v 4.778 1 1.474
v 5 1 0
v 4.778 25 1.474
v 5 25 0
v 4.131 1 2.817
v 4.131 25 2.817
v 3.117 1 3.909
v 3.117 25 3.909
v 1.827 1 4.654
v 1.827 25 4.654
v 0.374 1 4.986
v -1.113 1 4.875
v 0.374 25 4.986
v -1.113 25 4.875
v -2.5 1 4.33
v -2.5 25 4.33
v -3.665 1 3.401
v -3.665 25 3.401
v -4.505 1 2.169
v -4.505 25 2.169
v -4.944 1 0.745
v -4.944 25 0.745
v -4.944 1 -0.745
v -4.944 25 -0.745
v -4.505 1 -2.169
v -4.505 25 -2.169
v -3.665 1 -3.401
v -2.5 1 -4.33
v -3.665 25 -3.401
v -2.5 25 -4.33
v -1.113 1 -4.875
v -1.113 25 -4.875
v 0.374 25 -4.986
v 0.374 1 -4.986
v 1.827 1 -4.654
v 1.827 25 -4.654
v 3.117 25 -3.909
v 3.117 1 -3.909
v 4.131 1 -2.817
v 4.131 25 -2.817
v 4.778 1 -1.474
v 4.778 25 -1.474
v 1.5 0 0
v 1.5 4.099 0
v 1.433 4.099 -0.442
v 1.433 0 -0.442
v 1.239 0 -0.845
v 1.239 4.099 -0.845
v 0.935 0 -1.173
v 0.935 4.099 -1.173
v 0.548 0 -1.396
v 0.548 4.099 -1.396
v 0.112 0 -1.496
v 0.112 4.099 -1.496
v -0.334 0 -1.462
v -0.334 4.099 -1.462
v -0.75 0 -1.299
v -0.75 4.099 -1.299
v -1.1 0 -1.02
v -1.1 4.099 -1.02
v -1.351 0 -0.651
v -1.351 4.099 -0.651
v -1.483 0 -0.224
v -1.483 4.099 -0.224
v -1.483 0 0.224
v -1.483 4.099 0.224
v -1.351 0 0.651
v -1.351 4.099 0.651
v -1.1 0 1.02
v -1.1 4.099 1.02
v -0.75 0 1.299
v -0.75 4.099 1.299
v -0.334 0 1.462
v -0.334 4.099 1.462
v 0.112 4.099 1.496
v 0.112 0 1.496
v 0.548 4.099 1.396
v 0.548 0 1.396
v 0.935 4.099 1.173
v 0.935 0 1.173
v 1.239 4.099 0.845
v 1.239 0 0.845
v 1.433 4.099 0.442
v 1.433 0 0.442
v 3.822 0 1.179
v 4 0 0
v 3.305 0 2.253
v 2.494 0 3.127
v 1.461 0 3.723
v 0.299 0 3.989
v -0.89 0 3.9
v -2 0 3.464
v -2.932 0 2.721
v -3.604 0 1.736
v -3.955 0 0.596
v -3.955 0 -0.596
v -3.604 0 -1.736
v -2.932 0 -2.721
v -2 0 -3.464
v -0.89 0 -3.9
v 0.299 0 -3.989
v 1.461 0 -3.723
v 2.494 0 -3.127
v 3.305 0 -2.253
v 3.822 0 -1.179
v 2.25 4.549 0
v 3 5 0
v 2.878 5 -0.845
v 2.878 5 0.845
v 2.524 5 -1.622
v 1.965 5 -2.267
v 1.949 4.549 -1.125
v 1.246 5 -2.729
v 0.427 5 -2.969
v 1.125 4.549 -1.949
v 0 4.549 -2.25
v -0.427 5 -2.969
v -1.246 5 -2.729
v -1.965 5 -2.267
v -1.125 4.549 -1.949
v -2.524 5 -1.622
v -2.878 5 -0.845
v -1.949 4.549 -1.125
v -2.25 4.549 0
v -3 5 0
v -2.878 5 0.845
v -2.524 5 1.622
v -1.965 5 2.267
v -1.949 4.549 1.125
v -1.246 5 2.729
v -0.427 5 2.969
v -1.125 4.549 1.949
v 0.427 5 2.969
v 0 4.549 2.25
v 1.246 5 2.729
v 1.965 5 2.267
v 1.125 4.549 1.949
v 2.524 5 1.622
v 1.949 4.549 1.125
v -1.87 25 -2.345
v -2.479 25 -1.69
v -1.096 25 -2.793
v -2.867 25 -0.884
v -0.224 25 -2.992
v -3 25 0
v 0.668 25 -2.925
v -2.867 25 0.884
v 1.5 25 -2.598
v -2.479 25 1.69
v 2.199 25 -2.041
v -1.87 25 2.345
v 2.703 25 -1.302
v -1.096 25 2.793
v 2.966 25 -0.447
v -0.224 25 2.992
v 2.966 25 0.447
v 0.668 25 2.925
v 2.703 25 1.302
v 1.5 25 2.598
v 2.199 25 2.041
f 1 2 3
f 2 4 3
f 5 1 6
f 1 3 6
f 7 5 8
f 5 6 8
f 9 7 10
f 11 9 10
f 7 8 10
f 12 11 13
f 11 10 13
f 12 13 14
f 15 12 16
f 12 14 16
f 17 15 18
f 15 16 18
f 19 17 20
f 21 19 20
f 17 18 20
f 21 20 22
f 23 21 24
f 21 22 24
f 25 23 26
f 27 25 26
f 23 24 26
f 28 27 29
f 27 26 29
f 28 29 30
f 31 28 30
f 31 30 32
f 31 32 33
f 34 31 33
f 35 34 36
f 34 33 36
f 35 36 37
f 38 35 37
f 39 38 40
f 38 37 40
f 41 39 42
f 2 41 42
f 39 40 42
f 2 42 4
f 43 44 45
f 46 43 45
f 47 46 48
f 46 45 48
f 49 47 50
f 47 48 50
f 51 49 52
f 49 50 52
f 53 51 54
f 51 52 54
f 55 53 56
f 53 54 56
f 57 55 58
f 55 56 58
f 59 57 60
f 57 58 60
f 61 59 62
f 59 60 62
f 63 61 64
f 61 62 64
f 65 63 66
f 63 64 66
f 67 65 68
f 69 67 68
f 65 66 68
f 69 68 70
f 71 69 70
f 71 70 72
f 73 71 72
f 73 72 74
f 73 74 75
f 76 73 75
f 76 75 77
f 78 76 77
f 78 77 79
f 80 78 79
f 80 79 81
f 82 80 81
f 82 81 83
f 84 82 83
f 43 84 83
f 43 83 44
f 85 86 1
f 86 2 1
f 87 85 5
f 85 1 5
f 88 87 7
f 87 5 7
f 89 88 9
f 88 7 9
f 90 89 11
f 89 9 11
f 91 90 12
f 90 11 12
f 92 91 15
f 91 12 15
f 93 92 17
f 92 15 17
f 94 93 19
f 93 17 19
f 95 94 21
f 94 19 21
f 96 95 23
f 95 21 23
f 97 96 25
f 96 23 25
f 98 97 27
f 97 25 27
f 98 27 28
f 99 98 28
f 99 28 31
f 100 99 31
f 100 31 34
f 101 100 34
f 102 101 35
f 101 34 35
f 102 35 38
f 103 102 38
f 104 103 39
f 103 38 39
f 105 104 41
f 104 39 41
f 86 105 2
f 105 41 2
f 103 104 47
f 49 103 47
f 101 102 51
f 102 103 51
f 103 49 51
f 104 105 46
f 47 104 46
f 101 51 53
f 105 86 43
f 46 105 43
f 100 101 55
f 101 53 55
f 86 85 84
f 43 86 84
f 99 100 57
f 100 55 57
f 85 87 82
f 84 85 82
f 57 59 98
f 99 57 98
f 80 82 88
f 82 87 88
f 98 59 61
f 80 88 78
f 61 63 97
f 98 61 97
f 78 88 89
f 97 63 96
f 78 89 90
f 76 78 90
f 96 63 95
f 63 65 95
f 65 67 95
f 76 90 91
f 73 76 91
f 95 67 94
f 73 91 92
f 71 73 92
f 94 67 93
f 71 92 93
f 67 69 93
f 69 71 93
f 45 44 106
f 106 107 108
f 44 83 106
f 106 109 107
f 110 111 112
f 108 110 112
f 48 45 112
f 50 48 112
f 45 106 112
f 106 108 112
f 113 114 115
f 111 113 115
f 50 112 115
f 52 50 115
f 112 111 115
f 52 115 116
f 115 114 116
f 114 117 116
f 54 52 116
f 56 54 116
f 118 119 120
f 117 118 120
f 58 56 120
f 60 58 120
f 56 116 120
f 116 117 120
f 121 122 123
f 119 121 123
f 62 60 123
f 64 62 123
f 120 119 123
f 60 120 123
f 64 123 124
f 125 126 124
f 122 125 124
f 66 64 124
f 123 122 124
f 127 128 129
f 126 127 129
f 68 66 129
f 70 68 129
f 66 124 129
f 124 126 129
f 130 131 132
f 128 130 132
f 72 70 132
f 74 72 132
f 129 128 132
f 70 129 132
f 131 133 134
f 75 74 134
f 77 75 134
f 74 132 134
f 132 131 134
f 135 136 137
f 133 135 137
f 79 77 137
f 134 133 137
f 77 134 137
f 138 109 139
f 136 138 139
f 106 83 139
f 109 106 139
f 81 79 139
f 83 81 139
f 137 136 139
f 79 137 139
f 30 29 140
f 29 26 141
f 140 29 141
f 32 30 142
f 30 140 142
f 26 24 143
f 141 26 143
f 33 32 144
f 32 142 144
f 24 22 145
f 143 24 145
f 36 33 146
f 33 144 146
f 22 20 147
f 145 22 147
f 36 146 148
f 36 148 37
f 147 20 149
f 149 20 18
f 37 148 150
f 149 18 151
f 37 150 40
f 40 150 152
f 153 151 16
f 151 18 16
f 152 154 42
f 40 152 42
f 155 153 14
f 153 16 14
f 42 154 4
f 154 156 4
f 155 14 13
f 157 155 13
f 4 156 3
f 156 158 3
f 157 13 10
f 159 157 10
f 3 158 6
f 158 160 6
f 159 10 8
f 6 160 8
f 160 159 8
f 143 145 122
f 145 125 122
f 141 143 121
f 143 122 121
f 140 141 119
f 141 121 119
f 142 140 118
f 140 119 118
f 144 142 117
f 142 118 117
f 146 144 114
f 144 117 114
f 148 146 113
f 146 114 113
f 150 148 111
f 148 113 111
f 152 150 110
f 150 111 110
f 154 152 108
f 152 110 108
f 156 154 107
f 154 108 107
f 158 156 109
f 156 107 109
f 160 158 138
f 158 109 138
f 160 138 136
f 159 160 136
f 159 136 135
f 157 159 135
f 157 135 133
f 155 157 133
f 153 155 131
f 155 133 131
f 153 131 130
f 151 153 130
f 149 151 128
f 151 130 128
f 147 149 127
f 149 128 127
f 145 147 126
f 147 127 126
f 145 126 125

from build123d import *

# Parameters (mm, degrees)
F_6_0_6_DIAMETER_HOLE1_D     = 6
F_6_0_6_DIAMETER_HOLE1_DEPTH = 20
F_6_0_6_DIAMETER_HOLE1_TIP   = 1.802581857
SKETCH16_R                   = 1.5
CUT_EXTRUDE5_DEPTH           = 26


with BuildPart() as part:
    # Sketch3 → Revolve1 (revolve)
    with BuildSketch(Plane.XY):
        Polygon((0, 0), (4, 0), (5, 1), (5, 25), (0, 25), align=None)
    revolve(axis=Axis((0, 31.444228921, 0), (0, -1, 0)))

    # Ø6.0 (6) Diameter Hole1
    with Locations(Plane(origin=(0, 25, 0), x_dir=(1, 0, 0), z_dir=(0, 1, 0))):
        with Locations((0, 0)):
            Hole(F_6_0_6_DIAMETER_HOLE1_D / 2, depth=F_6_0_6_DIAMETER_HOLE1_DEPTH)
            with Locations((0, 0, -(F_6_0_6_DIAMETER_HOLE1_DEPTH + F_6_0_6_DIAMETER_HOLE1_TIP / 2))):  # 118° drill point
                Cone(0, F_6_0_6_DIAMETER_HOLE1_D / 2, F_6_0_6_DIAMETER_HOLE1_TIP, mode=Mode.SUBTRACT)

    # Sketch16 → Cut-Extrude5 (cut, through all)
    with BuildSketch(Plane(origin=(0, 25, 0), x_dir=(1, 0, 0), z_dir=(0, 1, 0))):
        Circle(SKETCH16_R)
    extrude(amount=-CUT_EXTRUDE5_DEPTH, mode=Mode.SUBTRACT)


solid = part.part
